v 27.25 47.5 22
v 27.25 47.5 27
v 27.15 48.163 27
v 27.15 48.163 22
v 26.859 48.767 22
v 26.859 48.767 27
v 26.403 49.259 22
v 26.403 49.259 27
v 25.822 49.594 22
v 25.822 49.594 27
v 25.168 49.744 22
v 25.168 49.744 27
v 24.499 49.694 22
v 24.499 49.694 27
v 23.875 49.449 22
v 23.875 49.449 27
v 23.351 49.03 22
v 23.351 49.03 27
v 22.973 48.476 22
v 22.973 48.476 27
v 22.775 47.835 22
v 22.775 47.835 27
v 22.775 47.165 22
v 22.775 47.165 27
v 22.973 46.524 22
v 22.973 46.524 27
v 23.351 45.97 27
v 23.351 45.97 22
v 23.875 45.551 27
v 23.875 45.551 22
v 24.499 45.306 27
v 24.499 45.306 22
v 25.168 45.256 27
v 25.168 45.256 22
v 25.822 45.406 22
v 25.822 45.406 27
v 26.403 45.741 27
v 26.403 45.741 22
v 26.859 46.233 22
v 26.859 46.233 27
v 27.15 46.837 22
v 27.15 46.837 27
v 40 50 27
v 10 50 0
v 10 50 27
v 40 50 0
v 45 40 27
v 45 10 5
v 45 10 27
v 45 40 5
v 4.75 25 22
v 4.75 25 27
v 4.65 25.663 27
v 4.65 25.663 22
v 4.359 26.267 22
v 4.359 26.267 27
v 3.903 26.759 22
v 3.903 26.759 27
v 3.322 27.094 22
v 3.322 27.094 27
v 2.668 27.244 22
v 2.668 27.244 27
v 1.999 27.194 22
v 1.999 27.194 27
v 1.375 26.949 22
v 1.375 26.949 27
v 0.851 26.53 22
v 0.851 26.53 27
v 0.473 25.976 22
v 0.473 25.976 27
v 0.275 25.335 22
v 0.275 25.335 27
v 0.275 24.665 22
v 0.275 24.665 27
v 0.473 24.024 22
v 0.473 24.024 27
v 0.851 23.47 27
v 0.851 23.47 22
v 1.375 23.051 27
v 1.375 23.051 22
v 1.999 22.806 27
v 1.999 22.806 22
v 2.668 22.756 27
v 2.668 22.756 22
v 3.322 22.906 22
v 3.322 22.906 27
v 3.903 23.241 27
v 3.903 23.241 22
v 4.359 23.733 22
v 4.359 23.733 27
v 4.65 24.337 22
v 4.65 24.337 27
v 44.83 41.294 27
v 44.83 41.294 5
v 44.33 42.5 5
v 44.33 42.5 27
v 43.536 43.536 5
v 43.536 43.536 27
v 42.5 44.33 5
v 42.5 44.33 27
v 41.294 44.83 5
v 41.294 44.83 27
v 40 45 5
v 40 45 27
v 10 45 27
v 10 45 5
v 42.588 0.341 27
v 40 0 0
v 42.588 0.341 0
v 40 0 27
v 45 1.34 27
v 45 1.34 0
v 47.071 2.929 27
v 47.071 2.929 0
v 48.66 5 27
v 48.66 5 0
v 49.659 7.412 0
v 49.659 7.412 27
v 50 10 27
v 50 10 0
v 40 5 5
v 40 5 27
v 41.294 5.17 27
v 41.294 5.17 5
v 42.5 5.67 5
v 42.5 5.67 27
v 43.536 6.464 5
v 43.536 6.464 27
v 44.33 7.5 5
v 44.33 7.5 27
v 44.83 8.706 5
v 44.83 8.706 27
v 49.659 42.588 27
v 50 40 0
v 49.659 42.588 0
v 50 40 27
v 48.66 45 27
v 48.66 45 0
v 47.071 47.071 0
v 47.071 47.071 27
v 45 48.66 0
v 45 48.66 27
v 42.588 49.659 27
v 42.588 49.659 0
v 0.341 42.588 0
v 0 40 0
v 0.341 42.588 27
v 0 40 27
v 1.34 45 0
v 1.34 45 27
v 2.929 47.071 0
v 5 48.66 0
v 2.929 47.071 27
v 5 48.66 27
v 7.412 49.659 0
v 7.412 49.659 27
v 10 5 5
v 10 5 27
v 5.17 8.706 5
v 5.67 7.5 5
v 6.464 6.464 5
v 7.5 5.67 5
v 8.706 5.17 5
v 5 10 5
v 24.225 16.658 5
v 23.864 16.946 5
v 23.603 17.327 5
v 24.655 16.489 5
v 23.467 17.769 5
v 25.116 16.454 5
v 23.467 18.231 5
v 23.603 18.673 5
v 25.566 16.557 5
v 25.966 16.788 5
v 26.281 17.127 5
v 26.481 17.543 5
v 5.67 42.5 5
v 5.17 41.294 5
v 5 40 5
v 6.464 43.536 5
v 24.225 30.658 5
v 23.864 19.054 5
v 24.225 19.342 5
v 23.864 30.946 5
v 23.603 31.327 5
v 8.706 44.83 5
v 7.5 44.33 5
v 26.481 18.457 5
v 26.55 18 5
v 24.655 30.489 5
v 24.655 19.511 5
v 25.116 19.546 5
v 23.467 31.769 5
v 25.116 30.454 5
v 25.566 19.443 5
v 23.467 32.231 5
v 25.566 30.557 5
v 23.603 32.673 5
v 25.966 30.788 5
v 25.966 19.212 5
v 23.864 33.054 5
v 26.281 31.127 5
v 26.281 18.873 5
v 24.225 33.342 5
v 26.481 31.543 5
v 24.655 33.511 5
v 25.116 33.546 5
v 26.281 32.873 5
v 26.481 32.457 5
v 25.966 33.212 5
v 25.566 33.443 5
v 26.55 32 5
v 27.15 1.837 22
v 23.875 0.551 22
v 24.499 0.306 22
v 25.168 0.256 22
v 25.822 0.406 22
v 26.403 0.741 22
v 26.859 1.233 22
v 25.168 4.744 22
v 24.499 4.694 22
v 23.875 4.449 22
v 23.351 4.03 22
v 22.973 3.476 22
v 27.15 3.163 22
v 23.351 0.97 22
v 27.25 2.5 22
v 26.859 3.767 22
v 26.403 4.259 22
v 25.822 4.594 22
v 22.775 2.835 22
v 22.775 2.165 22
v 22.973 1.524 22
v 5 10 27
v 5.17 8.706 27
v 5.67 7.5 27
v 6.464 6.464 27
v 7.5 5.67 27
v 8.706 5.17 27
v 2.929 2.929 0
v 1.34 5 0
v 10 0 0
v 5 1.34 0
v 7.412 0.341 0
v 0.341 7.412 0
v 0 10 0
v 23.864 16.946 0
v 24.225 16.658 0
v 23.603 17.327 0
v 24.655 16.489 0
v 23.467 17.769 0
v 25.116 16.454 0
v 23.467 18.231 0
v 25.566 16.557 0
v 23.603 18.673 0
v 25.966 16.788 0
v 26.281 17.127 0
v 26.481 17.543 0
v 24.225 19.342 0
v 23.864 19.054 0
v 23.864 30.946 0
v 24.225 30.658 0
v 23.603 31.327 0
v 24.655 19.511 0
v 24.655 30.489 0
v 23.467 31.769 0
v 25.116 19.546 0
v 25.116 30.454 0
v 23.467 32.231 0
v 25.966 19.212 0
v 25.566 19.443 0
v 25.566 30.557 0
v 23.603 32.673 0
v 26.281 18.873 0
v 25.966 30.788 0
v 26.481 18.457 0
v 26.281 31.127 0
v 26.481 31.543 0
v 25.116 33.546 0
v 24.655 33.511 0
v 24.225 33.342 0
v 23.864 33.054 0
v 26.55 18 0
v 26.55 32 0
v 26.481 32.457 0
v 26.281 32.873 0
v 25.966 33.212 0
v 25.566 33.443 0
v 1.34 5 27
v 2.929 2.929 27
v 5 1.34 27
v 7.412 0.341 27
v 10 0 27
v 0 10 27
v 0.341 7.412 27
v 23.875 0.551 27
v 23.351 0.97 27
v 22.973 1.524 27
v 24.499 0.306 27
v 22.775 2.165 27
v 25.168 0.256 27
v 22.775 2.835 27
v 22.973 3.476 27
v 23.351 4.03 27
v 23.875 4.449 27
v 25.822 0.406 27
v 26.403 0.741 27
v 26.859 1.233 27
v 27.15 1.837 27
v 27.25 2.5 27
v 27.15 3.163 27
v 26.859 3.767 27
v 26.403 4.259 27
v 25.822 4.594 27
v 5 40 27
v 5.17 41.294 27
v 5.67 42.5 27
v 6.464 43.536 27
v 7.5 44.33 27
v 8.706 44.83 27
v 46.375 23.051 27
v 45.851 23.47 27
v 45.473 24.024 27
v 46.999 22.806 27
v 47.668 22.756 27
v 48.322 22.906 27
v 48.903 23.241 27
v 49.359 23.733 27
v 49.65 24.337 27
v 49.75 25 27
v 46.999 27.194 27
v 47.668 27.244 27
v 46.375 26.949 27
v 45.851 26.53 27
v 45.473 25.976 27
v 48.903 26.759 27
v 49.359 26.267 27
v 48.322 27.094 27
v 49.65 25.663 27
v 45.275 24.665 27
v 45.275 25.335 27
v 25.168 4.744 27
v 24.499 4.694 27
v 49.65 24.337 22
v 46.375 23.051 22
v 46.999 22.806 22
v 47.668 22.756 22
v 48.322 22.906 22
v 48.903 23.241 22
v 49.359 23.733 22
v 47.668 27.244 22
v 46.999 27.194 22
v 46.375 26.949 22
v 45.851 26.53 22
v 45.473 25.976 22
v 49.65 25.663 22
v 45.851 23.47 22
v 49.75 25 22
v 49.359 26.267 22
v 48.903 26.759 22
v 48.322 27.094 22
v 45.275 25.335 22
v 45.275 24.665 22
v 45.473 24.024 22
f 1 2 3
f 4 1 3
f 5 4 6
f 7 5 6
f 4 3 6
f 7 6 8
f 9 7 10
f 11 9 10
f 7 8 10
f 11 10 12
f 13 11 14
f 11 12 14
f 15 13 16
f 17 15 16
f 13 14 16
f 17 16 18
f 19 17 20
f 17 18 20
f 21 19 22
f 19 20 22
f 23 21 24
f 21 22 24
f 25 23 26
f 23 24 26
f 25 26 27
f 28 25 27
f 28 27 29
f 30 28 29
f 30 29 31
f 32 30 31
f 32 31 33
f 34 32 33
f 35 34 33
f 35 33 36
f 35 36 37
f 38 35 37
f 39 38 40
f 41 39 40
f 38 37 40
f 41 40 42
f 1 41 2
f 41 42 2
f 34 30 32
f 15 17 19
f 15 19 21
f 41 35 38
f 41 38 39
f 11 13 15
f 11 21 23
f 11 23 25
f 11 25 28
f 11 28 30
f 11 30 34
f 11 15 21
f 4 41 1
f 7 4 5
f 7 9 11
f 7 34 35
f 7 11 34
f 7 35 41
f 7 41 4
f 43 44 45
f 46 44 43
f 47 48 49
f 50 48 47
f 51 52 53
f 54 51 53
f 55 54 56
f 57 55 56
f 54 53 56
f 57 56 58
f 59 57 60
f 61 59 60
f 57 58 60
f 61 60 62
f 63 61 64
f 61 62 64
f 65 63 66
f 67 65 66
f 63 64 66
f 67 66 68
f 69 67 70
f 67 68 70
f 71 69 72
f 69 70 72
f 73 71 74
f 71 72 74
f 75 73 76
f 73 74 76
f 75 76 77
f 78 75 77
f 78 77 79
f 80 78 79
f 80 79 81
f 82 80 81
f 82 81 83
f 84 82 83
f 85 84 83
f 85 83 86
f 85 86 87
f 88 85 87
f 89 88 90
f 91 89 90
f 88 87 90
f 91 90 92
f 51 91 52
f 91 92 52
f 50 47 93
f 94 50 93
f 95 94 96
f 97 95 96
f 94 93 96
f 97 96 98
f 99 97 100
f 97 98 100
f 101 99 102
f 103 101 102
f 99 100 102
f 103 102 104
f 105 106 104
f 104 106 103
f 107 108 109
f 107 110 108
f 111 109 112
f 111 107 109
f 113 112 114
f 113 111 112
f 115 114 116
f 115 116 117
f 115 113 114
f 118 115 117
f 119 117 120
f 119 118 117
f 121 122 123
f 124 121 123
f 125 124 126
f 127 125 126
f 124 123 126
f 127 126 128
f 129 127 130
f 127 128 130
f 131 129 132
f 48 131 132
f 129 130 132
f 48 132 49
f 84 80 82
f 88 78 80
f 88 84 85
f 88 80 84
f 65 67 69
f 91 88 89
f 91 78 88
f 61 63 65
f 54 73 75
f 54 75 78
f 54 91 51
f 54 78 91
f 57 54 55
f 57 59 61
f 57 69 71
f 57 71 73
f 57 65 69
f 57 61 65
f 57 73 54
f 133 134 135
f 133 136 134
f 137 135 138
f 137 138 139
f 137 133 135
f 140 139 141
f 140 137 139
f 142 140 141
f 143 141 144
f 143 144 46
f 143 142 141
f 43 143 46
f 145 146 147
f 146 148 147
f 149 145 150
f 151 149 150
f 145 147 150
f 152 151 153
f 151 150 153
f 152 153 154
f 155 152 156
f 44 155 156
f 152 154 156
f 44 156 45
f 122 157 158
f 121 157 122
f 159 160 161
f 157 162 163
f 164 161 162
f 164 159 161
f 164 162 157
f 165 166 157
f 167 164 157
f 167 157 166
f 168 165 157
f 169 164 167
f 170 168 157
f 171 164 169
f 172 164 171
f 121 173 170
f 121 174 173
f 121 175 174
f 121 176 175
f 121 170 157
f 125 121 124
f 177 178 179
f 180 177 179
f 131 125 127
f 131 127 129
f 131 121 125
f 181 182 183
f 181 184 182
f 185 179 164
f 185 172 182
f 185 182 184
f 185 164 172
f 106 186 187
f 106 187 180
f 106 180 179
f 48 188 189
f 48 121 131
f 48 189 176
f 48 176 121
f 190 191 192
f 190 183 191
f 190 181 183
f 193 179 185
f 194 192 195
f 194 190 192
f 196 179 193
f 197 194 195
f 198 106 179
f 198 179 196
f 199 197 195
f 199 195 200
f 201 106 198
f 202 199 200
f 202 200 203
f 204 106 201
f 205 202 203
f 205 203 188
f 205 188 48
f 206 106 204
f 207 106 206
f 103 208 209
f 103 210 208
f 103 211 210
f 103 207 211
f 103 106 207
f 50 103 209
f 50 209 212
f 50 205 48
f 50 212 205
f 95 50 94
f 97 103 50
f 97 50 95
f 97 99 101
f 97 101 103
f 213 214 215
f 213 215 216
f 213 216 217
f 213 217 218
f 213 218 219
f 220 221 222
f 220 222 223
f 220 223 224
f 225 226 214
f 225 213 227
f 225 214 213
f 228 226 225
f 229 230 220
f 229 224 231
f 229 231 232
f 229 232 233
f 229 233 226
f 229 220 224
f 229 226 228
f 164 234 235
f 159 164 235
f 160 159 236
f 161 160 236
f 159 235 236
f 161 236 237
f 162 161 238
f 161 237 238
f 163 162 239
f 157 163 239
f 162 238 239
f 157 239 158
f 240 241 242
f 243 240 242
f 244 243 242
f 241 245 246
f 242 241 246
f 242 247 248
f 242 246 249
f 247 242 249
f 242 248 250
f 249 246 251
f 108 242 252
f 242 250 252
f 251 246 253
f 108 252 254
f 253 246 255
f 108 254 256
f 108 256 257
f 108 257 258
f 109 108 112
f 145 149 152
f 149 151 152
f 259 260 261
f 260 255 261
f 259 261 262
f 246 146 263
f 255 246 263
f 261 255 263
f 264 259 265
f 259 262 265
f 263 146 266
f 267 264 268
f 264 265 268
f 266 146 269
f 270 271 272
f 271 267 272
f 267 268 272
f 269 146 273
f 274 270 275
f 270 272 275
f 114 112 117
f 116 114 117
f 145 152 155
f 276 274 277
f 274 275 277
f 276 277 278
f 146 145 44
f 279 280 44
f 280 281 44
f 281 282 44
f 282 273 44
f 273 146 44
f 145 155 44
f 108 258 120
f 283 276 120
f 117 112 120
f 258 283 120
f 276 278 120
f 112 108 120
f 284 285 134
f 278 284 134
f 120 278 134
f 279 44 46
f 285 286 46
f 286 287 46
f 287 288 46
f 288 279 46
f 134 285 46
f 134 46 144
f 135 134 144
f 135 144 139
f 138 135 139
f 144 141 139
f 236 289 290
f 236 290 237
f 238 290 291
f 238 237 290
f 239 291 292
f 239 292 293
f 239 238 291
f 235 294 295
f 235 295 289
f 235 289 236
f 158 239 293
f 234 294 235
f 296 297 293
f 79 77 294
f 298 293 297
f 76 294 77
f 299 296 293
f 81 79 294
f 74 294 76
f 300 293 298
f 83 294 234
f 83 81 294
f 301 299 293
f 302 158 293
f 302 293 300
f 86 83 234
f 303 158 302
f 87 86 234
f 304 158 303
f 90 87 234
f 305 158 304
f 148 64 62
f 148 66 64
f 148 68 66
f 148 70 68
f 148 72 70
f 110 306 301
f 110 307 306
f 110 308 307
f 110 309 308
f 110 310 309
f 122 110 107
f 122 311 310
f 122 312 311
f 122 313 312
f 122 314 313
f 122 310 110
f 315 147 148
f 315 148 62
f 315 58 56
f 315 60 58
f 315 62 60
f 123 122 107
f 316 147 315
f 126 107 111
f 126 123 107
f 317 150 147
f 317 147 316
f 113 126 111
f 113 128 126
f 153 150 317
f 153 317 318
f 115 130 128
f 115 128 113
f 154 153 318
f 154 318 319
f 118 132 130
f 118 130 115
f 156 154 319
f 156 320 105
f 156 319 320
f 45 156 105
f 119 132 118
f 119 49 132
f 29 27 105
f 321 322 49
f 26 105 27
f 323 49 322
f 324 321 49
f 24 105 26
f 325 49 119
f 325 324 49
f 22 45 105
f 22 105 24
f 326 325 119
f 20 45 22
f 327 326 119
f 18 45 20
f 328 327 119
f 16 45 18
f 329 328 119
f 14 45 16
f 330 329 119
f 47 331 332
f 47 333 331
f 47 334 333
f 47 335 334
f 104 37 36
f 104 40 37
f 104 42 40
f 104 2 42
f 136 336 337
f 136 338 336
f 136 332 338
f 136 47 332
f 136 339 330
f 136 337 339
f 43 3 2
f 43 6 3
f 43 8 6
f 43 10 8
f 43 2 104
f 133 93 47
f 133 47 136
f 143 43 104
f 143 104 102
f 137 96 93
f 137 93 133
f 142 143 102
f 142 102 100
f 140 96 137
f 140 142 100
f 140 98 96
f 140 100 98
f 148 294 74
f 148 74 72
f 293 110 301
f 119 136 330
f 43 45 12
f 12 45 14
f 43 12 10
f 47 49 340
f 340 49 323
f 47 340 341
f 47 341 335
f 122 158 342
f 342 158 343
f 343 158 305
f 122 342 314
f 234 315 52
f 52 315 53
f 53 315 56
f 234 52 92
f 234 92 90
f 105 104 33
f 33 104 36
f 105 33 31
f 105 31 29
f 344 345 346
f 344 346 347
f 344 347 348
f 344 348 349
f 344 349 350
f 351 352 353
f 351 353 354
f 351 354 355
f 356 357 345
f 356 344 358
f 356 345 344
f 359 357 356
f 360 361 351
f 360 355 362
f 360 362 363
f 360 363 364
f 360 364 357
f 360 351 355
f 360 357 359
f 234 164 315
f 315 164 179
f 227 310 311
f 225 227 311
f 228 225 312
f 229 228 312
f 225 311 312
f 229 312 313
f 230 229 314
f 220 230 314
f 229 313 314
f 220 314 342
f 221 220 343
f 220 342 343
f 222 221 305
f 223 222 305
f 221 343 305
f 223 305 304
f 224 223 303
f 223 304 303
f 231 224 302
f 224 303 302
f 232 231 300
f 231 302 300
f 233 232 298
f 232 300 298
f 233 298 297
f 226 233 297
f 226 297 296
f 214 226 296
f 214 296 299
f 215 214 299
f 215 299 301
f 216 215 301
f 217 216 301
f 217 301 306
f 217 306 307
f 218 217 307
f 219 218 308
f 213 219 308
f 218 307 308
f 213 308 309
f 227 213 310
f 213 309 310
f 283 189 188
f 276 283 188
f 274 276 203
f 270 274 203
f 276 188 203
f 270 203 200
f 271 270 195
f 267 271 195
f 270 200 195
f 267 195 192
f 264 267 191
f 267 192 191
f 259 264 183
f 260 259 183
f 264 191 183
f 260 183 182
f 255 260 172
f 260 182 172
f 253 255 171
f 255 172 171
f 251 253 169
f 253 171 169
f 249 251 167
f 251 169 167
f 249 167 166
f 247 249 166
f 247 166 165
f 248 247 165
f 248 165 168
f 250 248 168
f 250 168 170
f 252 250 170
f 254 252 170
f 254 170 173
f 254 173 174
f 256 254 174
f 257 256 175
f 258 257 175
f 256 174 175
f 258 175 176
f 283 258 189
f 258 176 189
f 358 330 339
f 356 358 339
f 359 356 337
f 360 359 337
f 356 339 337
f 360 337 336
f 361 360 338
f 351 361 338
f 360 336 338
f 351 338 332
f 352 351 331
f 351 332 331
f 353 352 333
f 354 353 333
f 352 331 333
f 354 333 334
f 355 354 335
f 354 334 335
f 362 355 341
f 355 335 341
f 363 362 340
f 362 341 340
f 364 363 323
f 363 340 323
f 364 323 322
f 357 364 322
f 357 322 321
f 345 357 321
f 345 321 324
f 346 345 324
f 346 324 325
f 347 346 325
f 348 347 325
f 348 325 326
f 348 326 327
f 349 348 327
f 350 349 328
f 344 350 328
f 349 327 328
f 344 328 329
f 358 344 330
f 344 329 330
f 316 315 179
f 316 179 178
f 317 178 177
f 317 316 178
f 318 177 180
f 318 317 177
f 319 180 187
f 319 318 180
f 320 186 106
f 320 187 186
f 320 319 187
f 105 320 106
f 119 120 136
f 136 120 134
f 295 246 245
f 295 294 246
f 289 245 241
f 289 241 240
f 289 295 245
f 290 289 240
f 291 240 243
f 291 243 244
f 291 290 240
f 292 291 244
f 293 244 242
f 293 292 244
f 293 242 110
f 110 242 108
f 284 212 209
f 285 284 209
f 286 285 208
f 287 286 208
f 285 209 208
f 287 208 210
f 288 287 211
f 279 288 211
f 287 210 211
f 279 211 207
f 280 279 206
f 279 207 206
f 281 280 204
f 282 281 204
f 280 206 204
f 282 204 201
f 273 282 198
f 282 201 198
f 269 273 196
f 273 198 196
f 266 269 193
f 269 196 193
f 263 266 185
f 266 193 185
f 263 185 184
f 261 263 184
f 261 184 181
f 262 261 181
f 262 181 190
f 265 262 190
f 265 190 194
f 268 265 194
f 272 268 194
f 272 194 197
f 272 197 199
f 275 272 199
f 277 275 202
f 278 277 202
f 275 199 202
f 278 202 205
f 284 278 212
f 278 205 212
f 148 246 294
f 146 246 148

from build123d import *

# Parameters (mm, degrees)
SKETCH1_W           = 50
SKETCH1_H           = 50
BOSS_EXTRUDE1_DEPTH = 27
FILLET1_R           = 10
SHELL1_T            = -5
SKETCH3_R           = 1.55
CUT_EXTRUDE1_DEPTH  = 5
SKETCH4_R           = 2.25
CUT_EXTRUDE2_DEPTH  = 5


with BuildPart() as part:
    # Sketch1 → Boss-Extrude1 (new body)
    with BuildSketch(Plane.XY):
        with Locations((25, 25)):
            Rectangle(SKETCH1_W, SKETCH1_H)
    extrude(amount=BOSS_EXTRUDE1_DEPTH)

    # Fillet1
    fillet1_edges = [part.edges().sort_by_distance(p)[0] for p in [
        (0, 50, 13.5),
        (50, 50, 13.5),
        (50, 0, 13.5),
        (0, 0, 13.5),
    ]]
    fillet(fillet1_edges, radius=FILLET1_R)

    # Shell1
    shell1_openings = [part.faces().sort_by_distance(p)[0] for p in [
        (25, 25, 27),
    ]]
    offset(amount=SHELL1_T, openings=shell1_openings, kind=Kind.INTERSECTION)

    # Sketch3 → Cut-Extrude1 (cut)
    with BuildSketch(Plane.XY.offset(5)):
        with Locations((25, 32)):
            Circle(SKETCH3_R)
        with Locations((25, 18)):
            Circle(SKETCH3_R)
    extrude(amount=-CUT_EXTRUDE1_DEPTH, mode=Mode.SUBTRACT)

    # Sketch4 → Cut-Extrude2 (cut)
    with BuildSketch(Plane.XY.offset(27)):
        with Locations((25, 2.5)):
            Circle(SKETCH4_R)
        with Locations((2.5, 25)):
            Circle(SKETCH4_R)
        with Locations((25, 47.5)):
            Circle(SKETCH4_R)
        with Locations((47.5, 25)):
            Circle(SKETCH4_R)
    extrude(amount=-CUT_EXTRUDE2_DEPTH, mode=Mode.SUBTRACT)


solid = part.part
